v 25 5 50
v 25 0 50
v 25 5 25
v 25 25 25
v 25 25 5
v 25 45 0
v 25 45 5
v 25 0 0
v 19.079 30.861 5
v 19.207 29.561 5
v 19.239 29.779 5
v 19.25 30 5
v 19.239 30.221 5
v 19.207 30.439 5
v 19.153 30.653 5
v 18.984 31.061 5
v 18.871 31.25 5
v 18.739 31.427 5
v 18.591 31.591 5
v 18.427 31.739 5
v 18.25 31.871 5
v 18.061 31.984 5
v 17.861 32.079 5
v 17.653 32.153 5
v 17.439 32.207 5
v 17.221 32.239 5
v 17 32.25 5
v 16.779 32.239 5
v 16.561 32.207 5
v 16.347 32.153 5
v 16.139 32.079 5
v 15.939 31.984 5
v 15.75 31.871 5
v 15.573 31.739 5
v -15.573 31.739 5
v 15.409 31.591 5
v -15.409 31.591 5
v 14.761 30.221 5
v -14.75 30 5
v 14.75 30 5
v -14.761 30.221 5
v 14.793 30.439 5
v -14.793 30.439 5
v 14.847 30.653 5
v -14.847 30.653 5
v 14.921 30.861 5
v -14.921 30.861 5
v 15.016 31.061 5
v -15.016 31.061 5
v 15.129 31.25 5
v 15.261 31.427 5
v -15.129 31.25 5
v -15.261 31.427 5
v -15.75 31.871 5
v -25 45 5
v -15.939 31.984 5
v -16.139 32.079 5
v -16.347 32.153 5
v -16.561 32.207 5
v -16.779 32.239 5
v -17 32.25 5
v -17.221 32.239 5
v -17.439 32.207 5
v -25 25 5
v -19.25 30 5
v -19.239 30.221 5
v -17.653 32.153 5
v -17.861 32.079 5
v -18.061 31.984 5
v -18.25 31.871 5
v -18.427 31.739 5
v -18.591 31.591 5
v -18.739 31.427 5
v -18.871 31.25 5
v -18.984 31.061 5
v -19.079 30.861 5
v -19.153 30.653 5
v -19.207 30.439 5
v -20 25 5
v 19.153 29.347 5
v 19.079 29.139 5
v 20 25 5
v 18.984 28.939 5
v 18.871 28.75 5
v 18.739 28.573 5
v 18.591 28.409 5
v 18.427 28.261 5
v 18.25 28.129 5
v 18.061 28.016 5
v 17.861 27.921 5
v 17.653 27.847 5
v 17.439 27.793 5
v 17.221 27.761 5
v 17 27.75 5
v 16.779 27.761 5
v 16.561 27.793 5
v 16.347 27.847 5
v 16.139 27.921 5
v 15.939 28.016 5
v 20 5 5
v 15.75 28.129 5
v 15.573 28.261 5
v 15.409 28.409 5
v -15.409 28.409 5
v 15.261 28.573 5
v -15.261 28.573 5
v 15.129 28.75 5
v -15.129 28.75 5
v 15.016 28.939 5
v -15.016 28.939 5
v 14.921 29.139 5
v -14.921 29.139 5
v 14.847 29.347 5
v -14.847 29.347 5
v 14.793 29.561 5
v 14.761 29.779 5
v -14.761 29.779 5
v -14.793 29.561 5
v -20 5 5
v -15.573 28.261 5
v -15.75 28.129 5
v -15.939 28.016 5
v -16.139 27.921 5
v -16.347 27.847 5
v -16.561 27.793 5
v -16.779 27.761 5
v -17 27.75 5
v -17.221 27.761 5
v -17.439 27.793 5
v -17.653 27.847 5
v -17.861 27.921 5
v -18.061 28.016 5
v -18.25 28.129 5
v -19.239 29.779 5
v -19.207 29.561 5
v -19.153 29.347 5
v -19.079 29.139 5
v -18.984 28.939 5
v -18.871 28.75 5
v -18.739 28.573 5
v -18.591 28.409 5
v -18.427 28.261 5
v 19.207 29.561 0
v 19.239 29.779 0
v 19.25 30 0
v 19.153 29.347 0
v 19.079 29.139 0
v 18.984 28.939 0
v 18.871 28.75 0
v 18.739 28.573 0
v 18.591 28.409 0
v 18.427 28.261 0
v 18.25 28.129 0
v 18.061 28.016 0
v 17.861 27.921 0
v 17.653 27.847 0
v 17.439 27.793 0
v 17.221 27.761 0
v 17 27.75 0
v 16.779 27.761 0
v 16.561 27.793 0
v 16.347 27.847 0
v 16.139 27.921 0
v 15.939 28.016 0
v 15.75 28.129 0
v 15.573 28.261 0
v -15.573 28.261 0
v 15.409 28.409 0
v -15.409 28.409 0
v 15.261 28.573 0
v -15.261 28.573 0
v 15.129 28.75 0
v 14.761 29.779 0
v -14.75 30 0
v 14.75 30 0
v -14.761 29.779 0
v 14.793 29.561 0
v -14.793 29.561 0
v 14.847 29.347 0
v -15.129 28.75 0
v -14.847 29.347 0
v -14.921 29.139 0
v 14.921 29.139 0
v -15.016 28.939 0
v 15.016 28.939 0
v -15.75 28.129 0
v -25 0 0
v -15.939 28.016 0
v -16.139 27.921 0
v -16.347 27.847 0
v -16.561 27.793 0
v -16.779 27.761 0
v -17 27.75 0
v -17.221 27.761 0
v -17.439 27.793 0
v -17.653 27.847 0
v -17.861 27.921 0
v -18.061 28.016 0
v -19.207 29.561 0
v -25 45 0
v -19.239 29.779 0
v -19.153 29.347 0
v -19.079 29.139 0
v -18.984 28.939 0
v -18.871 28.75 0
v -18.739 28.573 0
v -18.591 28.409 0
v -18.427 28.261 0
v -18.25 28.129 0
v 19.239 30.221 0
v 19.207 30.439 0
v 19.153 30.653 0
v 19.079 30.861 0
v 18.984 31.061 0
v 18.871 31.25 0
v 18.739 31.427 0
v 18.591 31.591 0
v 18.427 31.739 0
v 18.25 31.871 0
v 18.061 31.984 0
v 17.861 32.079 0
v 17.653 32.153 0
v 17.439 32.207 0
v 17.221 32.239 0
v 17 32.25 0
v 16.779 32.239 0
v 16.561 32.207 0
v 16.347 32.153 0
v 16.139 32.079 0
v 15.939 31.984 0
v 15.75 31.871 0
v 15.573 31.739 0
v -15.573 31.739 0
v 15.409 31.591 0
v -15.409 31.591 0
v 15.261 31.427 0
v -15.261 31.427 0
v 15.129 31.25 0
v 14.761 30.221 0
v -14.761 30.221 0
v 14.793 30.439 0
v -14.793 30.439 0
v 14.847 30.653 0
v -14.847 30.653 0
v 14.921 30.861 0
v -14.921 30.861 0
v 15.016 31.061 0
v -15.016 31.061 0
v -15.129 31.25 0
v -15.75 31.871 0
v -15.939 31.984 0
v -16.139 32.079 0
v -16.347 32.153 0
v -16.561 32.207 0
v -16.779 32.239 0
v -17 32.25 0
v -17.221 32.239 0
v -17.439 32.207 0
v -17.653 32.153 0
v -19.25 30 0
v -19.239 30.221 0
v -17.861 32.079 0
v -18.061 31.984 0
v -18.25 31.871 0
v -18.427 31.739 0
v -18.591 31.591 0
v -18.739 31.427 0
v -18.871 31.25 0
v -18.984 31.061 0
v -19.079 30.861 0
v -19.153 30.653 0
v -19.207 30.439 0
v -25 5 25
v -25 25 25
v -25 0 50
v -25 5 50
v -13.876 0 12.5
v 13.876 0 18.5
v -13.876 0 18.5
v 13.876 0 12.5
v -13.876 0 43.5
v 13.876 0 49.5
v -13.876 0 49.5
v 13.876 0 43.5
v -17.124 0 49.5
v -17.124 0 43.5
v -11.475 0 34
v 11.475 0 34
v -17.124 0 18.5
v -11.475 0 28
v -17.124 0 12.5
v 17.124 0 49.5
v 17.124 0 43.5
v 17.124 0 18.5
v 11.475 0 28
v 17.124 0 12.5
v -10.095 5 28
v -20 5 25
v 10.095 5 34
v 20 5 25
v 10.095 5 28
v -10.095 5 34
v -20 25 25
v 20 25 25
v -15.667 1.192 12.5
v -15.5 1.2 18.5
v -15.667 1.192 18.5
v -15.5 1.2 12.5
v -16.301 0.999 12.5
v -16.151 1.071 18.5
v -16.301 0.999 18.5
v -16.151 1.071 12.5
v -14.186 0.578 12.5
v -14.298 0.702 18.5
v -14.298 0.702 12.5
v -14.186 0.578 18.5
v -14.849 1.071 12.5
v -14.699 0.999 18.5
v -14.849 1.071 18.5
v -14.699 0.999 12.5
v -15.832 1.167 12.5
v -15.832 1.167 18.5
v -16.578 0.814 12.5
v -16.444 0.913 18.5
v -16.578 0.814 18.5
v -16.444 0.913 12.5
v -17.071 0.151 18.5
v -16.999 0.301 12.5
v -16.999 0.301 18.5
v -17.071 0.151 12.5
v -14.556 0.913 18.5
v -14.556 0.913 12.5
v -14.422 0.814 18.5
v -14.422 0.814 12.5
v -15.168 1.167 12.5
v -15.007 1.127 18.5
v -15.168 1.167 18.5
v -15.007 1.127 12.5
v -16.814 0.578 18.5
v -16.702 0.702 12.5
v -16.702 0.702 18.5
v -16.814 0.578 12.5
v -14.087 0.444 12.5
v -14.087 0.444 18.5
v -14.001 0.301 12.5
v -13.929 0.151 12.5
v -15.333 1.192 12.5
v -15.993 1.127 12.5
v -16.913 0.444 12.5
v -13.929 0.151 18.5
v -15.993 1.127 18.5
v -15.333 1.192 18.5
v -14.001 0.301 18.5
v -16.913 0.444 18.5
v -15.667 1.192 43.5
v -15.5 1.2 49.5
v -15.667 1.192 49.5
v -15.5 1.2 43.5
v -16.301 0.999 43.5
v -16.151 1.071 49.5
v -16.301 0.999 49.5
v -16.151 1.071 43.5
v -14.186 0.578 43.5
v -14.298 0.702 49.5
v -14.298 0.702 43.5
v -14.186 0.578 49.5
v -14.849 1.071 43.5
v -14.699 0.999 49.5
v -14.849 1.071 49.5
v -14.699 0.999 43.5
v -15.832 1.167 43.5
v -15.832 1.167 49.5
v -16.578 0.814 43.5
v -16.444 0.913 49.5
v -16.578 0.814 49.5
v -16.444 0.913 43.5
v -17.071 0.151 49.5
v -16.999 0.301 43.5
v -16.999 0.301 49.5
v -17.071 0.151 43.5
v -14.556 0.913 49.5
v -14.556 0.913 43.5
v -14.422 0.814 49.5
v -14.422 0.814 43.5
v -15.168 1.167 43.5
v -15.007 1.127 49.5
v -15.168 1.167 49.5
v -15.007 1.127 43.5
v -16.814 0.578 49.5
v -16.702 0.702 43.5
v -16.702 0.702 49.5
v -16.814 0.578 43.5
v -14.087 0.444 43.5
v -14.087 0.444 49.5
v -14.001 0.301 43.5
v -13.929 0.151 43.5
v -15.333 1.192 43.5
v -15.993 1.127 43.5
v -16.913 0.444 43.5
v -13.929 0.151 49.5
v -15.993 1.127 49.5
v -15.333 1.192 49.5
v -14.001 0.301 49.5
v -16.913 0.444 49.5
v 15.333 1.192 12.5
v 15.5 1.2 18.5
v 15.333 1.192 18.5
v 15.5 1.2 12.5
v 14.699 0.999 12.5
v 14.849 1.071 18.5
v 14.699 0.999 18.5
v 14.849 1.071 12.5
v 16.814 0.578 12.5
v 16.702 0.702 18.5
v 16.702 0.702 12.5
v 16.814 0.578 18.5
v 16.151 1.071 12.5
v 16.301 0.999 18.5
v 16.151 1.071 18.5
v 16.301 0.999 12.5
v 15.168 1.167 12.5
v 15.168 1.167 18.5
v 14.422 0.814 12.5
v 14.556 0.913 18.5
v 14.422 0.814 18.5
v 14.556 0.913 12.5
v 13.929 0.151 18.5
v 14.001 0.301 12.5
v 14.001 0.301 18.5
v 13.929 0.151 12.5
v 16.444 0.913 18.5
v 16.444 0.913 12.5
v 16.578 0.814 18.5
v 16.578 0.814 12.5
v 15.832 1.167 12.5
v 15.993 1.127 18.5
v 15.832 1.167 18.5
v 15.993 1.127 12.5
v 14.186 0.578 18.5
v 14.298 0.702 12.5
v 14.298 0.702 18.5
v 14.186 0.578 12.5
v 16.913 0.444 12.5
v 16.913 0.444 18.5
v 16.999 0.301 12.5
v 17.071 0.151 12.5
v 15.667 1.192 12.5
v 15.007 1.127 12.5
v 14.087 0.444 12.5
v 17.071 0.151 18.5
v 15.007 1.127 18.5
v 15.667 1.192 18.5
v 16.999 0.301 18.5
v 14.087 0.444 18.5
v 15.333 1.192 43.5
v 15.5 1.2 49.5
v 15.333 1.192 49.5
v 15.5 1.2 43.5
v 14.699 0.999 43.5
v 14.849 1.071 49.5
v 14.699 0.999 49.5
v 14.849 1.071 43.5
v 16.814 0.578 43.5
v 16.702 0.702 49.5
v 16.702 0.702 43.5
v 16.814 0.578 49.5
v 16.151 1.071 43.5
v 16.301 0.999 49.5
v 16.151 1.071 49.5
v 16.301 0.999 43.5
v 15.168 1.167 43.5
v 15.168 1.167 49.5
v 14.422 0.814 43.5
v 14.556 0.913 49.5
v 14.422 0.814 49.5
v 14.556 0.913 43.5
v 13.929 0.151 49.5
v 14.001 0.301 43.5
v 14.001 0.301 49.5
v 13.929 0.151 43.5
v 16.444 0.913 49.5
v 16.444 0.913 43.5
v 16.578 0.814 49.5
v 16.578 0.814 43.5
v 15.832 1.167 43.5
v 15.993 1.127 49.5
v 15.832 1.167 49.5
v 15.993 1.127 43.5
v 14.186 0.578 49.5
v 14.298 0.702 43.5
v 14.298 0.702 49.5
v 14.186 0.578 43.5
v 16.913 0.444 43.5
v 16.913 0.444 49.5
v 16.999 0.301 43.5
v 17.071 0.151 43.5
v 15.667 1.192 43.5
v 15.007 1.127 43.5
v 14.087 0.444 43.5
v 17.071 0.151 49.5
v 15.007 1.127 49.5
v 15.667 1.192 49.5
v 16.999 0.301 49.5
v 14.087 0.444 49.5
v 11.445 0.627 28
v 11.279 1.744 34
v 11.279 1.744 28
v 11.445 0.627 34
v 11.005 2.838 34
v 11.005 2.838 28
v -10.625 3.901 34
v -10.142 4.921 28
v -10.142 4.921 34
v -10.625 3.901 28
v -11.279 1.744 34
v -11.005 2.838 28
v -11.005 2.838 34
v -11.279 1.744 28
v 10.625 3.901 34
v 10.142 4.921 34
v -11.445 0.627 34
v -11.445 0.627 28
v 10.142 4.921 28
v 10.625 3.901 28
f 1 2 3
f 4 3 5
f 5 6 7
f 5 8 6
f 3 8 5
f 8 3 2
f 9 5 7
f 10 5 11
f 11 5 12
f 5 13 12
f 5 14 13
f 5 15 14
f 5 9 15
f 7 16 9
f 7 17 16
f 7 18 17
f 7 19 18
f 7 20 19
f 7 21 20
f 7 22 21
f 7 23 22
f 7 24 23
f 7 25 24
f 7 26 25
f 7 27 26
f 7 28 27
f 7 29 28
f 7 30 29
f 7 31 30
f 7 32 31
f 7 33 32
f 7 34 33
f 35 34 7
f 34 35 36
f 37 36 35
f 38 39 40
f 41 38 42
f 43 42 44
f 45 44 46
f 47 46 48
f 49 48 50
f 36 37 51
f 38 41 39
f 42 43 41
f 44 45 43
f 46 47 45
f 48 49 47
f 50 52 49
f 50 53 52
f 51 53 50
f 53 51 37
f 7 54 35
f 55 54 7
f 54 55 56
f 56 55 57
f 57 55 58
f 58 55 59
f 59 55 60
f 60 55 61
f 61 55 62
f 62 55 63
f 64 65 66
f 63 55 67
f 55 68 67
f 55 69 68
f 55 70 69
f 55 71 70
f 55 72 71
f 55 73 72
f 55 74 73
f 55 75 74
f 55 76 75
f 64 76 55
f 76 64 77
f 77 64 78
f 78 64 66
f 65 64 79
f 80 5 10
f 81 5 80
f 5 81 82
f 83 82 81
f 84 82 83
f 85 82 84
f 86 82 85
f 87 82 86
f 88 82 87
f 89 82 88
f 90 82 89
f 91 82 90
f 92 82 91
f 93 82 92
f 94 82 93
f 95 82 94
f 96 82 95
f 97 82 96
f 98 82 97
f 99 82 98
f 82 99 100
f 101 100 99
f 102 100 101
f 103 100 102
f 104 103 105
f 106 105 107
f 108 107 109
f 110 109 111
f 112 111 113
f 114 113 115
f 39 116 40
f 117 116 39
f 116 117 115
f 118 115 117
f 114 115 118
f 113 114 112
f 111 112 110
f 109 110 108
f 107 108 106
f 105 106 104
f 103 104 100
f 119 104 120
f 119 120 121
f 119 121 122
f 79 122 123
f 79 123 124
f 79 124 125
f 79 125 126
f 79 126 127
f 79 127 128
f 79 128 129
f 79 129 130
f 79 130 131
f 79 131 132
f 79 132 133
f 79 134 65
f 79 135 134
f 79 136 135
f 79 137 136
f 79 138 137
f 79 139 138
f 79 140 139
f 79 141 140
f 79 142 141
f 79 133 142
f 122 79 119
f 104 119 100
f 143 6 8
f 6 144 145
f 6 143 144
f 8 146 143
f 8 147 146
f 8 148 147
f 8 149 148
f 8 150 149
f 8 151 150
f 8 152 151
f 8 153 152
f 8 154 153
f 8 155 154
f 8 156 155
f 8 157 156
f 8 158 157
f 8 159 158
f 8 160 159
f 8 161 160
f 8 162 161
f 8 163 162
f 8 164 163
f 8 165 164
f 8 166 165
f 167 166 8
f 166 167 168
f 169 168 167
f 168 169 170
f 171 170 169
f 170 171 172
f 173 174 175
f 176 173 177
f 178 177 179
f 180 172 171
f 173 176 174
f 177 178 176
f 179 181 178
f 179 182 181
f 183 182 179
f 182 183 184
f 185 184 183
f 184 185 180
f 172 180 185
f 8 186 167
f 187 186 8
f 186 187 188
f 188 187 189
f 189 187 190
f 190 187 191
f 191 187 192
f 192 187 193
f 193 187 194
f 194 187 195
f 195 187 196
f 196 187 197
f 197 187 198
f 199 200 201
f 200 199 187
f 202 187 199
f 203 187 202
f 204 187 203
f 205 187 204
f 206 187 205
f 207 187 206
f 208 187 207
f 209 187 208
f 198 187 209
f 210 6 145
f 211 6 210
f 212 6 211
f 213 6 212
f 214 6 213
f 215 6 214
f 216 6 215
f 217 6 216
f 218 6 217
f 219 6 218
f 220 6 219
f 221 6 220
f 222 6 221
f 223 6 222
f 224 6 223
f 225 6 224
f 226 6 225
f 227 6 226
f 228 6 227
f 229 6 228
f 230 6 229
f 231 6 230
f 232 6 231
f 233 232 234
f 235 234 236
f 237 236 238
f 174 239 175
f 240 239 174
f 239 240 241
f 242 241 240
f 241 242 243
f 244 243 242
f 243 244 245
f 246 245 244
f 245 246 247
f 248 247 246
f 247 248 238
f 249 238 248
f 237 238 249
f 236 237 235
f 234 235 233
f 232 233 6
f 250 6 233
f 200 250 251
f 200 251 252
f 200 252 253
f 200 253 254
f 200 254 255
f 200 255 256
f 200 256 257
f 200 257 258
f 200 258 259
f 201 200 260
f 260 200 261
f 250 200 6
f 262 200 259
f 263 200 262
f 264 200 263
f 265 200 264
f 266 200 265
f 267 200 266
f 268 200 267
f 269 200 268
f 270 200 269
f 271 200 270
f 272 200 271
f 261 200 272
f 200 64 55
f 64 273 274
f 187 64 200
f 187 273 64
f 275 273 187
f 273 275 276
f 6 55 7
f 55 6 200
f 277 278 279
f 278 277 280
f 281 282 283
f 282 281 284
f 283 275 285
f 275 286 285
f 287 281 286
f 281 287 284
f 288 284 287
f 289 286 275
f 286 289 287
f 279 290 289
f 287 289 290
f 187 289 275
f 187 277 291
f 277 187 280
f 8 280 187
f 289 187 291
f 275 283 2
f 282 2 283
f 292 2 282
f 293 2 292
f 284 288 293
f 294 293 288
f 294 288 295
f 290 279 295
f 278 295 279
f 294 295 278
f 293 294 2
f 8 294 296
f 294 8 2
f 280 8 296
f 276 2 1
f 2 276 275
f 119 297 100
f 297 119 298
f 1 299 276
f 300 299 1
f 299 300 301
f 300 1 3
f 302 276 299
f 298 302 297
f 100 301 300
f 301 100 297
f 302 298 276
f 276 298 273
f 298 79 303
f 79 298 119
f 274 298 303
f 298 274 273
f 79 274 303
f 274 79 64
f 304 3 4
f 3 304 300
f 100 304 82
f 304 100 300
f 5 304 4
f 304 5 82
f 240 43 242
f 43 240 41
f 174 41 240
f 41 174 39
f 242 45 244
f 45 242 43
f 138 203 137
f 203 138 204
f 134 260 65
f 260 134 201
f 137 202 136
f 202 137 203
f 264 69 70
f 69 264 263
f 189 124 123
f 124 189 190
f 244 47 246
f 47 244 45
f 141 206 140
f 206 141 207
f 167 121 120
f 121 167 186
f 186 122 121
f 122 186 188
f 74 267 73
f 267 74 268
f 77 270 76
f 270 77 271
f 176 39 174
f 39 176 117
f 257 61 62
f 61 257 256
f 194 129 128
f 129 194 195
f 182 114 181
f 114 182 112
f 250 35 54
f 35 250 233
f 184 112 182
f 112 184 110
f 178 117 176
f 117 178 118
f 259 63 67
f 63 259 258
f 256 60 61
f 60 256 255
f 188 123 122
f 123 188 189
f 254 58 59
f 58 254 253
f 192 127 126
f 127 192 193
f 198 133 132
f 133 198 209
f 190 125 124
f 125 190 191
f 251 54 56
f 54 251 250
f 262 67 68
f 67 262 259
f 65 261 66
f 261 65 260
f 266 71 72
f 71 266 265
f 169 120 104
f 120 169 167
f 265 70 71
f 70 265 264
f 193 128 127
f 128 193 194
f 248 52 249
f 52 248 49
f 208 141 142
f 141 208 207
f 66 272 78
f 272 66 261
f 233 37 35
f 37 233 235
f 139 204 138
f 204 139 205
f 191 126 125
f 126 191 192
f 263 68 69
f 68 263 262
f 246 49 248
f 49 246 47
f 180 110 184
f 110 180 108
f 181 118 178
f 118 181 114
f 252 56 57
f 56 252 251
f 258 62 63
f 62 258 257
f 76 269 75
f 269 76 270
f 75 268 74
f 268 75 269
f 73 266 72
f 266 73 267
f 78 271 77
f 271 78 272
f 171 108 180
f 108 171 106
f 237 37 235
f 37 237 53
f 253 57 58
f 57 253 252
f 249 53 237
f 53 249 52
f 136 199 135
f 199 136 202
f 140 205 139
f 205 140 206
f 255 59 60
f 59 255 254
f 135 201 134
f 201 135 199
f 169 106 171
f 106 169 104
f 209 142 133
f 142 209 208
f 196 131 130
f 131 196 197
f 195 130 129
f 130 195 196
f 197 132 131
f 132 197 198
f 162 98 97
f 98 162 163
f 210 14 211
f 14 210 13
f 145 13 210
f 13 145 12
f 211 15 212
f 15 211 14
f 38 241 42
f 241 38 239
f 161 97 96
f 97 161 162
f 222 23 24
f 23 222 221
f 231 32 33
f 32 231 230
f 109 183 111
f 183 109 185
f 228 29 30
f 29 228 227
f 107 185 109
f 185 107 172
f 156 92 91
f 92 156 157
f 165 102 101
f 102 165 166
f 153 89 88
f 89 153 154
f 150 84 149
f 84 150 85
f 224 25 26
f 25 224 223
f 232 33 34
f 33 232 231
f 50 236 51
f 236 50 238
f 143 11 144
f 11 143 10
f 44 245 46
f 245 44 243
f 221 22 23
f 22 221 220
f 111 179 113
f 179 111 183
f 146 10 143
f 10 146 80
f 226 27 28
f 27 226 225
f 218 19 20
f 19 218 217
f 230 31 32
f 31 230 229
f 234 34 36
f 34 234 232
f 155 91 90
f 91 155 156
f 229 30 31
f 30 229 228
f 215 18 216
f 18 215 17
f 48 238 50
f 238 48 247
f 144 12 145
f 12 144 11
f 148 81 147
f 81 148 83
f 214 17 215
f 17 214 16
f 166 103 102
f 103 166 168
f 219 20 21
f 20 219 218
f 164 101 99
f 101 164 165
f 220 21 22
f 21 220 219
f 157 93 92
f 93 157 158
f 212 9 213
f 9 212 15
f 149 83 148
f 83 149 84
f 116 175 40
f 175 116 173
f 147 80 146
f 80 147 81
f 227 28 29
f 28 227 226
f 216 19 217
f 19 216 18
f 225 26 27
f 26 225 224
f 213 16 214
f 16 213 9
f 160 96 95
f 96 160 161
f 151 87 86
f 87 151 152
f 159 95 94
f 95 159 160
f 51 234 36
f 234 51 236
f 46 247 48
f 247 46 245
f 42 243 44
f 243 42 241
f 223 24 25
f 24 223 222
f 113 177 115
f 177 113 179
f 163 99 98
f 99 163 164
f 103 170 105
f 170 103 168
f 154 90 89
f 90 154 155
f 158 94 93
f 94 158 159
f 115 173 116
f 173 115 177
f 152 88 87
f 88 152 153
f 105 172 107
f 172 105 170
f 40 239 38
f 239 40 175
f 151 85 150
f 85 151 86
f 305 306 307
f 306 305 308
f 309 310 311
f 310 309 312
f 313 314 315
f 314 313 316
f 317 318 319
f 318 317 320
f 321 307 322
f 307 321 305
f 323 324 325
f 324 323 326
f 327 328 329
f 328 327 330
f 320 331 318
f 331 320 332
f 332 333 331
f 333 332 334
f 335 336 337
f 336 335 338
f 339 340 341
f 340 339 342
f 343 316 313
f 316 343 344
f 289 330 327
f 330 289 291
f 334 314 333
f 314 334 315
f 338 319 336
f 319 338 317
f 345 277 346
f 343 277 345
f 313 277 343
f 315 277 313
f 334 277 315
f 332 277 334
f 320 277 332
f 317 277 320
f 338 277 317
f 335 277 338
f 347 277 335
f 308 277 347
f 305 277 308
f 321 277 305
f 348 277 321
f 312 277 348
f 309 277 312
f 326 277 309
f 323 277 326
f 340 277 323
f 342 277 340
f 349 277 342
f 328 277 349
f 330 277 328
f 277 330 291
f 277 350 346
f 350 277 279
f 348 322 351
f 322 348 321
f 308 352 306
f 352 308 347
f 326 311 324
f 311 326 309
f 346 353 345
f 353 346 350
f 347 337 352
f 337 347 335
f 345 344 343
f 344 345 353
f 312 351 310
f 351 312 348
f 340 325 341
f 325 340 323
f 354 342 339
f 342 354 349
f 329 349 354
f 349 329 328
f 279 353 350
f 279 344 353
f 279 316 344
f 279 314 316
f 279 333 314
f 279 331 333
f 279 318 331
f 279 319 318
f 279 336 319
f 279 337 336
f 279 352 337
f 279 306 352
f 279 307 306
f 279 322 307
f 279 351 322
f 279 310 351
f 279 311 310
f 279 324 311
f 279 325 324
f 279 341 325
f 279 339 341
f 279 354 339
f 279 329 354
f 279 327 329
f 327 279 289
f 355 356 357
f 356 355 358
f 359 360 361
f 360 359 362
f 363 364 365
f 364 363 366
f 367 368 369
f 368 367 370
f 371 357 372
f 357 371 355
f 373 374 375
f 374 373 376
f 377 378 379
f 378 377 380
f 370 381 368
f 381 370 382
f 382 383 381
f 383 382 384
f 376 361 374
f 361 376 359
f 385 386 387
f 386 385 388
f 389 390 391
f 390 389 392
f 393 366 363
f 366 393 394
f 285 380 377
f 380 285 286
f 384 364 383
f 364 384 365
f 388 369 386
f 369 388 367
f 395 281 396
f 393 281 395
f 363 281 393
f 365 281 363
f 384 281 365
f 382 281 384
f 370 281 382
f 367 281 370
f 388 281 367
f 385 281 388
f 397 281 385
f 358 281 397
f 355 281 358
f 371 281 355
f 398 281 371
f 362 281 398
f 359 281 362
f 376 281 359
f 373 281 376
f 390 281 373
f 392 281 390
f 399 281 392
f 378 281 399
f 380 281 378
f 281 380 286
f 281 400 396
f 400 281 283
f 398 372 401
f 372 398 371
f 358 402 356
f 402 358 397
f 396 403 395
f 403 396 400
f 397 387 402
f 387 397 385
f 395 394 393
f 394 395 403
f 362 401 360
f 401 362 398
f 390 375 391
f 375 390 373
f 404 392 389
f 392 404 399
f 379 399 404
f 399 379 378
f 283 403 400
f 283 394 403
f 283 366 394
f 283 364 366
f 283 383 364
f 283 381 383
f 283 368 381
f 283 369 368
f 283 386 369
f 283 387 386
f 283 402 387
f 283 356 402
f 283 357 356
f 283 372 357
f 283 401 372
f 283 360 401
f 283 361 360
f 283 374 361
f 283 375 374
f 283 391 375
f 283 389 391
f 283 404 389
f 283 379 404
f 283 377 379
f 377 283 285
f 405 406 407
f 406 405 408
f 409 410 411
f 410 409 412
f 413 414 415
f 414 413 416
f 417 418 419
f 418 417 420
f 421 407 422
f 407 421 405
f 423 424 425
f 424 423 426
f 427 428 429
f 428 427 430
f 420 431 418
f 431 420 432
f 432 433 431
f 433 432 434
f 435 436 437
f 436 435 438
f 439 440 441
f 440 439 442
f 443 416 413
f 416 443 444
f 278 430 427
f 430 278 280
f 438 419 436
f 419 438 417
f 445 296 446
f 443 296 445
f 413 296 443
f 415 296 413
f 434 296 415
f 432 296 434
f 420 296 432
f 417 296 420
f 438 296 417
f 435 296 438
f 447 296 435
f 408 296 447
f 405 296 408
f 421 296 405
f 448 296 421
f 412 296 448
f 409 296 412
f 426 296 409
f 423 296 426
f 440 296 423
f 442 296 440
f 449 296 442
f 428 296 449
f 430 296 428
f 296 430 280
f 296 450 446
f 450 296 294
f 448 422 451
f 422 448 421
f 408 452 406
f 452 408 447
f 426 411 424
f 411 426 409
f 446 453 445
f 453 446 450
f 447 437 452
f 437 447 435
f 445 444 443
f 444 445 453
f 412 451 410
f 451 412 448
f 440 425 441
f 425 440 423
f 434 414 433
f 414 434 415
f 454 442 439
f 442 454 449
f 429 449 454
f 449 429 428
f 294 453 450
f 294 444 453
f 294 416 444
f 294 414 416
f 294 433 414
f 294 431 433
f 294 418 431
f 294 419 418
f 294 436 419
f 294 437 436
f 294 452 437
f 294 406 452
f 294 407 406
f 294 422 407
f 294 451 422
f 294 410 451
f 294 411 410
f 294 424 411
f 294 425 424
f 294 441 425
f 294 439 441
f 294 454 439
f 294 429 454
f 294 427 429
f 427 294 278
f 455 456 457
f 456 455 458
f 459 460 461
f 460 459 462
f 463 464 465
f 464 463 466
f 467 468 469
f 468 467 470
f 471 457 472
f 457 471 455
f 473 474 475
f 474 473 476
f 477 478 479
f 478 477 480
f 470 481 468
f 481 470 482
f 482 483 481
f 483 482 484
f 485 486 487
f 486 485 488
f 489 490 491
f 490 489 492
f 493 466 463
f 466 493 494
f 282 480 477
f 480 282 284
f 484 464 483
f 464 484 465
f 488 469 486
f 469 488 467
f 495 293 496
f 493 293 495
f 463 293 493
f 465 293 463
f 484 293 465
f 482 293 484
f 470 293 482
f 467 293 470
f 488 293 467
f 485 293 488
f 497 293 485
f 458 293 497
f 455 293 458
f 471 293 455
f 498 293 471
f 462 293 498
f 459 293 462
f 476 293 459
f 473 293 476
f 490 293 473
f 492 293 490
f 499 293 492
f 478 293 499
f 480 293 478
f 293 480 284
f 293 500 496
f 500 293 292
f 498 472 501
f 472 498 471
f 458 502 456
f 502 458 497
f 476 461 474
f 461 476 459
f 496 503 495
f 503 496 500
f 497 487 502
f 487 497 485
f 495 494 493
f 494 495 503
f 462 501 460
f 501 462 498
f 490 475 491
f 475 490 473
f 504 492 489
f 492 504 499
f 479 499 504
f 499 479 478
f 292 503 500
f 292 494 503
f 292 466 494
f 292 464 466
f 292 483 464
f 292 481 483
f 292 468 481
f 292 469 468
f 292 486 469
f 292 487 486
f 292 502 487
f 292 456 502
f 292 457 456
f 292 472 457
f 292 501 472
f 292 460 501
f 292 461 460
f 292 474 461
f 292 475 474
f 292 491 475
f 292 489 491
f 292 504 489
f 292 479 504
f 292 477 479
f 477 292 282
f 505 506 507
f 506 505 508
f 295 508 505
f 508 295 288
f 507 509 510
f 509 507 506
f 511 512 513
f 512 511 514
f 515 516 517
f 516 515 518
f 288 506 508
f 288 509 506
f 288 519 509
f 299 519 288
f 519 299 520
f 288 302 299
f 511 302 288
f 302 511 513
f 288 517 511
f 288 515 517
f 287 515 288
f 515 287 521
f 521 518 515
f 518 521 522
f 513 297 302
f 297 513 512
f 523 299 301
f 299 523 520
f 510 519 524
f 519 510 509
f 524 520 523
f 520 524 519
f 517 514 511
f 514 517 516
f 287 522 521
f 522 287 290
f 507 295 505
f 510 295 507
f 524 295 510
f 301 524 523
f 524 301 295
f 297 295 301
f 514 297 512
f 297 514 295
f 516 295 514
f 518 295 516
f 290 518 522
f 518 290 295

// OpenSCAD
// L-shaped mounting bracket for NEMA 17 stepper motor (e.g. syringe pump)
// Print orientation: base plate on the bed (z = 0), vertical plate builds up along +Z

$fn = 64;

// ---------------- Base plate ----------------
base_x_min   = -25;   // base plate X start
base_x_max   = 25;    // base plate X end
base_y_min   = 0;     // base plate Y start (back edge)
base_y_max   = 45;    // base plate Y end (front edge)
base_thick   = 5;     // base plate thickness (Z)

// ---------------- Vertical motor plate ----------------
vert_x_min   = -25;   // motor plate X start
vert_x_max   = 25;    // motor plate X end
vert_y_min   = 0;     // motor plate Y start
vert_y_max   = 5;     // motor plate Y end (thickness)
vert_height  = 50;    // motor plate height (Z)

// ---------------- Boss hole ----------------
boss_d       = 23;    // motor centring boss hole diameter
boss_x       = 0;     // boss hole X centre
boss_z       = 28;    // boss hole Z centre

// ---------------- Screw holes ----------------
screw_d      = 3.4;   // M3 screw hole diameter
pitch        = 31;    // square pitch for screw holes
screw_x      = 0;     // screw hole pattern X centre
screw_z      = boss_z; // screw hole pattern Z centre

// ---------------- Gussets ----------------
gusset_x_l   = -25;   // left gusset X start
gusset_x_r   = -20;   // left gusset X end
gusset_y     = 20;    // gusset leg length along +Y
gusset_z     = 20;    // gusset leg length along +Z
gusset_t     = 5;     // gusset thickness (X)

gusset_x_p   = 20;    // right gusset X start
gusset_x_e   = 25;    // right gusset X end

eps          = 0.5;   // cutter overshoot

// ---------------- Derived ----------------
width = base_x_max - base_x_min;

difference() {
    union() {
        // Base plate
        translate([base_x_min, base_y_min, 0])
            cube([width, base_y_max - base_y_min, base_thick]);

        // Vertical motor plate
        translate([vert_x_min, vert_y_min, 0])
            cube([width, vert_y_max - vert_y_min, vert_height]);

        // Left gusset (right-angle corner at y = 5, z = 5)
        translate([gusset_x_l, 5, 5])
            cube([gusset_x_r - gusset_x_l, gusset_y, gusset_z]);

        // Right gusset
        translate([gusset_x_p, 5, 5])
            cube([gusset_x_e - gusset_x_p, gusset_y, gusset_z]);
    }

    // Vertical through-holes in base plate (M4)
    for (sx = [-1, 1])
        translate([sx * 17, 30, -eps])
            cylinder(d = 4.5, h = base_thick + 2 * eps);

    // Boss hole through motor plate (along Y)
    translate([boss_x, vert_y_min - eps, boss_z])
        cylinder(d = boss_d, h = (vert_y_max - vert_y_min) + 2 * eps);

    // M3 screw holes on square pattern centred on boss hole
    for (ox = [-pitch / 2, pitch / 2])
        for (oz = [-pitch / 2, pitch / 2])
            translate([screw_x + ox, vert_y_min - eps, screw_z + oz])
                cylinder(d = screw_d, h = (vert_y_max - vert_y_min) + 2 * eps);
}
